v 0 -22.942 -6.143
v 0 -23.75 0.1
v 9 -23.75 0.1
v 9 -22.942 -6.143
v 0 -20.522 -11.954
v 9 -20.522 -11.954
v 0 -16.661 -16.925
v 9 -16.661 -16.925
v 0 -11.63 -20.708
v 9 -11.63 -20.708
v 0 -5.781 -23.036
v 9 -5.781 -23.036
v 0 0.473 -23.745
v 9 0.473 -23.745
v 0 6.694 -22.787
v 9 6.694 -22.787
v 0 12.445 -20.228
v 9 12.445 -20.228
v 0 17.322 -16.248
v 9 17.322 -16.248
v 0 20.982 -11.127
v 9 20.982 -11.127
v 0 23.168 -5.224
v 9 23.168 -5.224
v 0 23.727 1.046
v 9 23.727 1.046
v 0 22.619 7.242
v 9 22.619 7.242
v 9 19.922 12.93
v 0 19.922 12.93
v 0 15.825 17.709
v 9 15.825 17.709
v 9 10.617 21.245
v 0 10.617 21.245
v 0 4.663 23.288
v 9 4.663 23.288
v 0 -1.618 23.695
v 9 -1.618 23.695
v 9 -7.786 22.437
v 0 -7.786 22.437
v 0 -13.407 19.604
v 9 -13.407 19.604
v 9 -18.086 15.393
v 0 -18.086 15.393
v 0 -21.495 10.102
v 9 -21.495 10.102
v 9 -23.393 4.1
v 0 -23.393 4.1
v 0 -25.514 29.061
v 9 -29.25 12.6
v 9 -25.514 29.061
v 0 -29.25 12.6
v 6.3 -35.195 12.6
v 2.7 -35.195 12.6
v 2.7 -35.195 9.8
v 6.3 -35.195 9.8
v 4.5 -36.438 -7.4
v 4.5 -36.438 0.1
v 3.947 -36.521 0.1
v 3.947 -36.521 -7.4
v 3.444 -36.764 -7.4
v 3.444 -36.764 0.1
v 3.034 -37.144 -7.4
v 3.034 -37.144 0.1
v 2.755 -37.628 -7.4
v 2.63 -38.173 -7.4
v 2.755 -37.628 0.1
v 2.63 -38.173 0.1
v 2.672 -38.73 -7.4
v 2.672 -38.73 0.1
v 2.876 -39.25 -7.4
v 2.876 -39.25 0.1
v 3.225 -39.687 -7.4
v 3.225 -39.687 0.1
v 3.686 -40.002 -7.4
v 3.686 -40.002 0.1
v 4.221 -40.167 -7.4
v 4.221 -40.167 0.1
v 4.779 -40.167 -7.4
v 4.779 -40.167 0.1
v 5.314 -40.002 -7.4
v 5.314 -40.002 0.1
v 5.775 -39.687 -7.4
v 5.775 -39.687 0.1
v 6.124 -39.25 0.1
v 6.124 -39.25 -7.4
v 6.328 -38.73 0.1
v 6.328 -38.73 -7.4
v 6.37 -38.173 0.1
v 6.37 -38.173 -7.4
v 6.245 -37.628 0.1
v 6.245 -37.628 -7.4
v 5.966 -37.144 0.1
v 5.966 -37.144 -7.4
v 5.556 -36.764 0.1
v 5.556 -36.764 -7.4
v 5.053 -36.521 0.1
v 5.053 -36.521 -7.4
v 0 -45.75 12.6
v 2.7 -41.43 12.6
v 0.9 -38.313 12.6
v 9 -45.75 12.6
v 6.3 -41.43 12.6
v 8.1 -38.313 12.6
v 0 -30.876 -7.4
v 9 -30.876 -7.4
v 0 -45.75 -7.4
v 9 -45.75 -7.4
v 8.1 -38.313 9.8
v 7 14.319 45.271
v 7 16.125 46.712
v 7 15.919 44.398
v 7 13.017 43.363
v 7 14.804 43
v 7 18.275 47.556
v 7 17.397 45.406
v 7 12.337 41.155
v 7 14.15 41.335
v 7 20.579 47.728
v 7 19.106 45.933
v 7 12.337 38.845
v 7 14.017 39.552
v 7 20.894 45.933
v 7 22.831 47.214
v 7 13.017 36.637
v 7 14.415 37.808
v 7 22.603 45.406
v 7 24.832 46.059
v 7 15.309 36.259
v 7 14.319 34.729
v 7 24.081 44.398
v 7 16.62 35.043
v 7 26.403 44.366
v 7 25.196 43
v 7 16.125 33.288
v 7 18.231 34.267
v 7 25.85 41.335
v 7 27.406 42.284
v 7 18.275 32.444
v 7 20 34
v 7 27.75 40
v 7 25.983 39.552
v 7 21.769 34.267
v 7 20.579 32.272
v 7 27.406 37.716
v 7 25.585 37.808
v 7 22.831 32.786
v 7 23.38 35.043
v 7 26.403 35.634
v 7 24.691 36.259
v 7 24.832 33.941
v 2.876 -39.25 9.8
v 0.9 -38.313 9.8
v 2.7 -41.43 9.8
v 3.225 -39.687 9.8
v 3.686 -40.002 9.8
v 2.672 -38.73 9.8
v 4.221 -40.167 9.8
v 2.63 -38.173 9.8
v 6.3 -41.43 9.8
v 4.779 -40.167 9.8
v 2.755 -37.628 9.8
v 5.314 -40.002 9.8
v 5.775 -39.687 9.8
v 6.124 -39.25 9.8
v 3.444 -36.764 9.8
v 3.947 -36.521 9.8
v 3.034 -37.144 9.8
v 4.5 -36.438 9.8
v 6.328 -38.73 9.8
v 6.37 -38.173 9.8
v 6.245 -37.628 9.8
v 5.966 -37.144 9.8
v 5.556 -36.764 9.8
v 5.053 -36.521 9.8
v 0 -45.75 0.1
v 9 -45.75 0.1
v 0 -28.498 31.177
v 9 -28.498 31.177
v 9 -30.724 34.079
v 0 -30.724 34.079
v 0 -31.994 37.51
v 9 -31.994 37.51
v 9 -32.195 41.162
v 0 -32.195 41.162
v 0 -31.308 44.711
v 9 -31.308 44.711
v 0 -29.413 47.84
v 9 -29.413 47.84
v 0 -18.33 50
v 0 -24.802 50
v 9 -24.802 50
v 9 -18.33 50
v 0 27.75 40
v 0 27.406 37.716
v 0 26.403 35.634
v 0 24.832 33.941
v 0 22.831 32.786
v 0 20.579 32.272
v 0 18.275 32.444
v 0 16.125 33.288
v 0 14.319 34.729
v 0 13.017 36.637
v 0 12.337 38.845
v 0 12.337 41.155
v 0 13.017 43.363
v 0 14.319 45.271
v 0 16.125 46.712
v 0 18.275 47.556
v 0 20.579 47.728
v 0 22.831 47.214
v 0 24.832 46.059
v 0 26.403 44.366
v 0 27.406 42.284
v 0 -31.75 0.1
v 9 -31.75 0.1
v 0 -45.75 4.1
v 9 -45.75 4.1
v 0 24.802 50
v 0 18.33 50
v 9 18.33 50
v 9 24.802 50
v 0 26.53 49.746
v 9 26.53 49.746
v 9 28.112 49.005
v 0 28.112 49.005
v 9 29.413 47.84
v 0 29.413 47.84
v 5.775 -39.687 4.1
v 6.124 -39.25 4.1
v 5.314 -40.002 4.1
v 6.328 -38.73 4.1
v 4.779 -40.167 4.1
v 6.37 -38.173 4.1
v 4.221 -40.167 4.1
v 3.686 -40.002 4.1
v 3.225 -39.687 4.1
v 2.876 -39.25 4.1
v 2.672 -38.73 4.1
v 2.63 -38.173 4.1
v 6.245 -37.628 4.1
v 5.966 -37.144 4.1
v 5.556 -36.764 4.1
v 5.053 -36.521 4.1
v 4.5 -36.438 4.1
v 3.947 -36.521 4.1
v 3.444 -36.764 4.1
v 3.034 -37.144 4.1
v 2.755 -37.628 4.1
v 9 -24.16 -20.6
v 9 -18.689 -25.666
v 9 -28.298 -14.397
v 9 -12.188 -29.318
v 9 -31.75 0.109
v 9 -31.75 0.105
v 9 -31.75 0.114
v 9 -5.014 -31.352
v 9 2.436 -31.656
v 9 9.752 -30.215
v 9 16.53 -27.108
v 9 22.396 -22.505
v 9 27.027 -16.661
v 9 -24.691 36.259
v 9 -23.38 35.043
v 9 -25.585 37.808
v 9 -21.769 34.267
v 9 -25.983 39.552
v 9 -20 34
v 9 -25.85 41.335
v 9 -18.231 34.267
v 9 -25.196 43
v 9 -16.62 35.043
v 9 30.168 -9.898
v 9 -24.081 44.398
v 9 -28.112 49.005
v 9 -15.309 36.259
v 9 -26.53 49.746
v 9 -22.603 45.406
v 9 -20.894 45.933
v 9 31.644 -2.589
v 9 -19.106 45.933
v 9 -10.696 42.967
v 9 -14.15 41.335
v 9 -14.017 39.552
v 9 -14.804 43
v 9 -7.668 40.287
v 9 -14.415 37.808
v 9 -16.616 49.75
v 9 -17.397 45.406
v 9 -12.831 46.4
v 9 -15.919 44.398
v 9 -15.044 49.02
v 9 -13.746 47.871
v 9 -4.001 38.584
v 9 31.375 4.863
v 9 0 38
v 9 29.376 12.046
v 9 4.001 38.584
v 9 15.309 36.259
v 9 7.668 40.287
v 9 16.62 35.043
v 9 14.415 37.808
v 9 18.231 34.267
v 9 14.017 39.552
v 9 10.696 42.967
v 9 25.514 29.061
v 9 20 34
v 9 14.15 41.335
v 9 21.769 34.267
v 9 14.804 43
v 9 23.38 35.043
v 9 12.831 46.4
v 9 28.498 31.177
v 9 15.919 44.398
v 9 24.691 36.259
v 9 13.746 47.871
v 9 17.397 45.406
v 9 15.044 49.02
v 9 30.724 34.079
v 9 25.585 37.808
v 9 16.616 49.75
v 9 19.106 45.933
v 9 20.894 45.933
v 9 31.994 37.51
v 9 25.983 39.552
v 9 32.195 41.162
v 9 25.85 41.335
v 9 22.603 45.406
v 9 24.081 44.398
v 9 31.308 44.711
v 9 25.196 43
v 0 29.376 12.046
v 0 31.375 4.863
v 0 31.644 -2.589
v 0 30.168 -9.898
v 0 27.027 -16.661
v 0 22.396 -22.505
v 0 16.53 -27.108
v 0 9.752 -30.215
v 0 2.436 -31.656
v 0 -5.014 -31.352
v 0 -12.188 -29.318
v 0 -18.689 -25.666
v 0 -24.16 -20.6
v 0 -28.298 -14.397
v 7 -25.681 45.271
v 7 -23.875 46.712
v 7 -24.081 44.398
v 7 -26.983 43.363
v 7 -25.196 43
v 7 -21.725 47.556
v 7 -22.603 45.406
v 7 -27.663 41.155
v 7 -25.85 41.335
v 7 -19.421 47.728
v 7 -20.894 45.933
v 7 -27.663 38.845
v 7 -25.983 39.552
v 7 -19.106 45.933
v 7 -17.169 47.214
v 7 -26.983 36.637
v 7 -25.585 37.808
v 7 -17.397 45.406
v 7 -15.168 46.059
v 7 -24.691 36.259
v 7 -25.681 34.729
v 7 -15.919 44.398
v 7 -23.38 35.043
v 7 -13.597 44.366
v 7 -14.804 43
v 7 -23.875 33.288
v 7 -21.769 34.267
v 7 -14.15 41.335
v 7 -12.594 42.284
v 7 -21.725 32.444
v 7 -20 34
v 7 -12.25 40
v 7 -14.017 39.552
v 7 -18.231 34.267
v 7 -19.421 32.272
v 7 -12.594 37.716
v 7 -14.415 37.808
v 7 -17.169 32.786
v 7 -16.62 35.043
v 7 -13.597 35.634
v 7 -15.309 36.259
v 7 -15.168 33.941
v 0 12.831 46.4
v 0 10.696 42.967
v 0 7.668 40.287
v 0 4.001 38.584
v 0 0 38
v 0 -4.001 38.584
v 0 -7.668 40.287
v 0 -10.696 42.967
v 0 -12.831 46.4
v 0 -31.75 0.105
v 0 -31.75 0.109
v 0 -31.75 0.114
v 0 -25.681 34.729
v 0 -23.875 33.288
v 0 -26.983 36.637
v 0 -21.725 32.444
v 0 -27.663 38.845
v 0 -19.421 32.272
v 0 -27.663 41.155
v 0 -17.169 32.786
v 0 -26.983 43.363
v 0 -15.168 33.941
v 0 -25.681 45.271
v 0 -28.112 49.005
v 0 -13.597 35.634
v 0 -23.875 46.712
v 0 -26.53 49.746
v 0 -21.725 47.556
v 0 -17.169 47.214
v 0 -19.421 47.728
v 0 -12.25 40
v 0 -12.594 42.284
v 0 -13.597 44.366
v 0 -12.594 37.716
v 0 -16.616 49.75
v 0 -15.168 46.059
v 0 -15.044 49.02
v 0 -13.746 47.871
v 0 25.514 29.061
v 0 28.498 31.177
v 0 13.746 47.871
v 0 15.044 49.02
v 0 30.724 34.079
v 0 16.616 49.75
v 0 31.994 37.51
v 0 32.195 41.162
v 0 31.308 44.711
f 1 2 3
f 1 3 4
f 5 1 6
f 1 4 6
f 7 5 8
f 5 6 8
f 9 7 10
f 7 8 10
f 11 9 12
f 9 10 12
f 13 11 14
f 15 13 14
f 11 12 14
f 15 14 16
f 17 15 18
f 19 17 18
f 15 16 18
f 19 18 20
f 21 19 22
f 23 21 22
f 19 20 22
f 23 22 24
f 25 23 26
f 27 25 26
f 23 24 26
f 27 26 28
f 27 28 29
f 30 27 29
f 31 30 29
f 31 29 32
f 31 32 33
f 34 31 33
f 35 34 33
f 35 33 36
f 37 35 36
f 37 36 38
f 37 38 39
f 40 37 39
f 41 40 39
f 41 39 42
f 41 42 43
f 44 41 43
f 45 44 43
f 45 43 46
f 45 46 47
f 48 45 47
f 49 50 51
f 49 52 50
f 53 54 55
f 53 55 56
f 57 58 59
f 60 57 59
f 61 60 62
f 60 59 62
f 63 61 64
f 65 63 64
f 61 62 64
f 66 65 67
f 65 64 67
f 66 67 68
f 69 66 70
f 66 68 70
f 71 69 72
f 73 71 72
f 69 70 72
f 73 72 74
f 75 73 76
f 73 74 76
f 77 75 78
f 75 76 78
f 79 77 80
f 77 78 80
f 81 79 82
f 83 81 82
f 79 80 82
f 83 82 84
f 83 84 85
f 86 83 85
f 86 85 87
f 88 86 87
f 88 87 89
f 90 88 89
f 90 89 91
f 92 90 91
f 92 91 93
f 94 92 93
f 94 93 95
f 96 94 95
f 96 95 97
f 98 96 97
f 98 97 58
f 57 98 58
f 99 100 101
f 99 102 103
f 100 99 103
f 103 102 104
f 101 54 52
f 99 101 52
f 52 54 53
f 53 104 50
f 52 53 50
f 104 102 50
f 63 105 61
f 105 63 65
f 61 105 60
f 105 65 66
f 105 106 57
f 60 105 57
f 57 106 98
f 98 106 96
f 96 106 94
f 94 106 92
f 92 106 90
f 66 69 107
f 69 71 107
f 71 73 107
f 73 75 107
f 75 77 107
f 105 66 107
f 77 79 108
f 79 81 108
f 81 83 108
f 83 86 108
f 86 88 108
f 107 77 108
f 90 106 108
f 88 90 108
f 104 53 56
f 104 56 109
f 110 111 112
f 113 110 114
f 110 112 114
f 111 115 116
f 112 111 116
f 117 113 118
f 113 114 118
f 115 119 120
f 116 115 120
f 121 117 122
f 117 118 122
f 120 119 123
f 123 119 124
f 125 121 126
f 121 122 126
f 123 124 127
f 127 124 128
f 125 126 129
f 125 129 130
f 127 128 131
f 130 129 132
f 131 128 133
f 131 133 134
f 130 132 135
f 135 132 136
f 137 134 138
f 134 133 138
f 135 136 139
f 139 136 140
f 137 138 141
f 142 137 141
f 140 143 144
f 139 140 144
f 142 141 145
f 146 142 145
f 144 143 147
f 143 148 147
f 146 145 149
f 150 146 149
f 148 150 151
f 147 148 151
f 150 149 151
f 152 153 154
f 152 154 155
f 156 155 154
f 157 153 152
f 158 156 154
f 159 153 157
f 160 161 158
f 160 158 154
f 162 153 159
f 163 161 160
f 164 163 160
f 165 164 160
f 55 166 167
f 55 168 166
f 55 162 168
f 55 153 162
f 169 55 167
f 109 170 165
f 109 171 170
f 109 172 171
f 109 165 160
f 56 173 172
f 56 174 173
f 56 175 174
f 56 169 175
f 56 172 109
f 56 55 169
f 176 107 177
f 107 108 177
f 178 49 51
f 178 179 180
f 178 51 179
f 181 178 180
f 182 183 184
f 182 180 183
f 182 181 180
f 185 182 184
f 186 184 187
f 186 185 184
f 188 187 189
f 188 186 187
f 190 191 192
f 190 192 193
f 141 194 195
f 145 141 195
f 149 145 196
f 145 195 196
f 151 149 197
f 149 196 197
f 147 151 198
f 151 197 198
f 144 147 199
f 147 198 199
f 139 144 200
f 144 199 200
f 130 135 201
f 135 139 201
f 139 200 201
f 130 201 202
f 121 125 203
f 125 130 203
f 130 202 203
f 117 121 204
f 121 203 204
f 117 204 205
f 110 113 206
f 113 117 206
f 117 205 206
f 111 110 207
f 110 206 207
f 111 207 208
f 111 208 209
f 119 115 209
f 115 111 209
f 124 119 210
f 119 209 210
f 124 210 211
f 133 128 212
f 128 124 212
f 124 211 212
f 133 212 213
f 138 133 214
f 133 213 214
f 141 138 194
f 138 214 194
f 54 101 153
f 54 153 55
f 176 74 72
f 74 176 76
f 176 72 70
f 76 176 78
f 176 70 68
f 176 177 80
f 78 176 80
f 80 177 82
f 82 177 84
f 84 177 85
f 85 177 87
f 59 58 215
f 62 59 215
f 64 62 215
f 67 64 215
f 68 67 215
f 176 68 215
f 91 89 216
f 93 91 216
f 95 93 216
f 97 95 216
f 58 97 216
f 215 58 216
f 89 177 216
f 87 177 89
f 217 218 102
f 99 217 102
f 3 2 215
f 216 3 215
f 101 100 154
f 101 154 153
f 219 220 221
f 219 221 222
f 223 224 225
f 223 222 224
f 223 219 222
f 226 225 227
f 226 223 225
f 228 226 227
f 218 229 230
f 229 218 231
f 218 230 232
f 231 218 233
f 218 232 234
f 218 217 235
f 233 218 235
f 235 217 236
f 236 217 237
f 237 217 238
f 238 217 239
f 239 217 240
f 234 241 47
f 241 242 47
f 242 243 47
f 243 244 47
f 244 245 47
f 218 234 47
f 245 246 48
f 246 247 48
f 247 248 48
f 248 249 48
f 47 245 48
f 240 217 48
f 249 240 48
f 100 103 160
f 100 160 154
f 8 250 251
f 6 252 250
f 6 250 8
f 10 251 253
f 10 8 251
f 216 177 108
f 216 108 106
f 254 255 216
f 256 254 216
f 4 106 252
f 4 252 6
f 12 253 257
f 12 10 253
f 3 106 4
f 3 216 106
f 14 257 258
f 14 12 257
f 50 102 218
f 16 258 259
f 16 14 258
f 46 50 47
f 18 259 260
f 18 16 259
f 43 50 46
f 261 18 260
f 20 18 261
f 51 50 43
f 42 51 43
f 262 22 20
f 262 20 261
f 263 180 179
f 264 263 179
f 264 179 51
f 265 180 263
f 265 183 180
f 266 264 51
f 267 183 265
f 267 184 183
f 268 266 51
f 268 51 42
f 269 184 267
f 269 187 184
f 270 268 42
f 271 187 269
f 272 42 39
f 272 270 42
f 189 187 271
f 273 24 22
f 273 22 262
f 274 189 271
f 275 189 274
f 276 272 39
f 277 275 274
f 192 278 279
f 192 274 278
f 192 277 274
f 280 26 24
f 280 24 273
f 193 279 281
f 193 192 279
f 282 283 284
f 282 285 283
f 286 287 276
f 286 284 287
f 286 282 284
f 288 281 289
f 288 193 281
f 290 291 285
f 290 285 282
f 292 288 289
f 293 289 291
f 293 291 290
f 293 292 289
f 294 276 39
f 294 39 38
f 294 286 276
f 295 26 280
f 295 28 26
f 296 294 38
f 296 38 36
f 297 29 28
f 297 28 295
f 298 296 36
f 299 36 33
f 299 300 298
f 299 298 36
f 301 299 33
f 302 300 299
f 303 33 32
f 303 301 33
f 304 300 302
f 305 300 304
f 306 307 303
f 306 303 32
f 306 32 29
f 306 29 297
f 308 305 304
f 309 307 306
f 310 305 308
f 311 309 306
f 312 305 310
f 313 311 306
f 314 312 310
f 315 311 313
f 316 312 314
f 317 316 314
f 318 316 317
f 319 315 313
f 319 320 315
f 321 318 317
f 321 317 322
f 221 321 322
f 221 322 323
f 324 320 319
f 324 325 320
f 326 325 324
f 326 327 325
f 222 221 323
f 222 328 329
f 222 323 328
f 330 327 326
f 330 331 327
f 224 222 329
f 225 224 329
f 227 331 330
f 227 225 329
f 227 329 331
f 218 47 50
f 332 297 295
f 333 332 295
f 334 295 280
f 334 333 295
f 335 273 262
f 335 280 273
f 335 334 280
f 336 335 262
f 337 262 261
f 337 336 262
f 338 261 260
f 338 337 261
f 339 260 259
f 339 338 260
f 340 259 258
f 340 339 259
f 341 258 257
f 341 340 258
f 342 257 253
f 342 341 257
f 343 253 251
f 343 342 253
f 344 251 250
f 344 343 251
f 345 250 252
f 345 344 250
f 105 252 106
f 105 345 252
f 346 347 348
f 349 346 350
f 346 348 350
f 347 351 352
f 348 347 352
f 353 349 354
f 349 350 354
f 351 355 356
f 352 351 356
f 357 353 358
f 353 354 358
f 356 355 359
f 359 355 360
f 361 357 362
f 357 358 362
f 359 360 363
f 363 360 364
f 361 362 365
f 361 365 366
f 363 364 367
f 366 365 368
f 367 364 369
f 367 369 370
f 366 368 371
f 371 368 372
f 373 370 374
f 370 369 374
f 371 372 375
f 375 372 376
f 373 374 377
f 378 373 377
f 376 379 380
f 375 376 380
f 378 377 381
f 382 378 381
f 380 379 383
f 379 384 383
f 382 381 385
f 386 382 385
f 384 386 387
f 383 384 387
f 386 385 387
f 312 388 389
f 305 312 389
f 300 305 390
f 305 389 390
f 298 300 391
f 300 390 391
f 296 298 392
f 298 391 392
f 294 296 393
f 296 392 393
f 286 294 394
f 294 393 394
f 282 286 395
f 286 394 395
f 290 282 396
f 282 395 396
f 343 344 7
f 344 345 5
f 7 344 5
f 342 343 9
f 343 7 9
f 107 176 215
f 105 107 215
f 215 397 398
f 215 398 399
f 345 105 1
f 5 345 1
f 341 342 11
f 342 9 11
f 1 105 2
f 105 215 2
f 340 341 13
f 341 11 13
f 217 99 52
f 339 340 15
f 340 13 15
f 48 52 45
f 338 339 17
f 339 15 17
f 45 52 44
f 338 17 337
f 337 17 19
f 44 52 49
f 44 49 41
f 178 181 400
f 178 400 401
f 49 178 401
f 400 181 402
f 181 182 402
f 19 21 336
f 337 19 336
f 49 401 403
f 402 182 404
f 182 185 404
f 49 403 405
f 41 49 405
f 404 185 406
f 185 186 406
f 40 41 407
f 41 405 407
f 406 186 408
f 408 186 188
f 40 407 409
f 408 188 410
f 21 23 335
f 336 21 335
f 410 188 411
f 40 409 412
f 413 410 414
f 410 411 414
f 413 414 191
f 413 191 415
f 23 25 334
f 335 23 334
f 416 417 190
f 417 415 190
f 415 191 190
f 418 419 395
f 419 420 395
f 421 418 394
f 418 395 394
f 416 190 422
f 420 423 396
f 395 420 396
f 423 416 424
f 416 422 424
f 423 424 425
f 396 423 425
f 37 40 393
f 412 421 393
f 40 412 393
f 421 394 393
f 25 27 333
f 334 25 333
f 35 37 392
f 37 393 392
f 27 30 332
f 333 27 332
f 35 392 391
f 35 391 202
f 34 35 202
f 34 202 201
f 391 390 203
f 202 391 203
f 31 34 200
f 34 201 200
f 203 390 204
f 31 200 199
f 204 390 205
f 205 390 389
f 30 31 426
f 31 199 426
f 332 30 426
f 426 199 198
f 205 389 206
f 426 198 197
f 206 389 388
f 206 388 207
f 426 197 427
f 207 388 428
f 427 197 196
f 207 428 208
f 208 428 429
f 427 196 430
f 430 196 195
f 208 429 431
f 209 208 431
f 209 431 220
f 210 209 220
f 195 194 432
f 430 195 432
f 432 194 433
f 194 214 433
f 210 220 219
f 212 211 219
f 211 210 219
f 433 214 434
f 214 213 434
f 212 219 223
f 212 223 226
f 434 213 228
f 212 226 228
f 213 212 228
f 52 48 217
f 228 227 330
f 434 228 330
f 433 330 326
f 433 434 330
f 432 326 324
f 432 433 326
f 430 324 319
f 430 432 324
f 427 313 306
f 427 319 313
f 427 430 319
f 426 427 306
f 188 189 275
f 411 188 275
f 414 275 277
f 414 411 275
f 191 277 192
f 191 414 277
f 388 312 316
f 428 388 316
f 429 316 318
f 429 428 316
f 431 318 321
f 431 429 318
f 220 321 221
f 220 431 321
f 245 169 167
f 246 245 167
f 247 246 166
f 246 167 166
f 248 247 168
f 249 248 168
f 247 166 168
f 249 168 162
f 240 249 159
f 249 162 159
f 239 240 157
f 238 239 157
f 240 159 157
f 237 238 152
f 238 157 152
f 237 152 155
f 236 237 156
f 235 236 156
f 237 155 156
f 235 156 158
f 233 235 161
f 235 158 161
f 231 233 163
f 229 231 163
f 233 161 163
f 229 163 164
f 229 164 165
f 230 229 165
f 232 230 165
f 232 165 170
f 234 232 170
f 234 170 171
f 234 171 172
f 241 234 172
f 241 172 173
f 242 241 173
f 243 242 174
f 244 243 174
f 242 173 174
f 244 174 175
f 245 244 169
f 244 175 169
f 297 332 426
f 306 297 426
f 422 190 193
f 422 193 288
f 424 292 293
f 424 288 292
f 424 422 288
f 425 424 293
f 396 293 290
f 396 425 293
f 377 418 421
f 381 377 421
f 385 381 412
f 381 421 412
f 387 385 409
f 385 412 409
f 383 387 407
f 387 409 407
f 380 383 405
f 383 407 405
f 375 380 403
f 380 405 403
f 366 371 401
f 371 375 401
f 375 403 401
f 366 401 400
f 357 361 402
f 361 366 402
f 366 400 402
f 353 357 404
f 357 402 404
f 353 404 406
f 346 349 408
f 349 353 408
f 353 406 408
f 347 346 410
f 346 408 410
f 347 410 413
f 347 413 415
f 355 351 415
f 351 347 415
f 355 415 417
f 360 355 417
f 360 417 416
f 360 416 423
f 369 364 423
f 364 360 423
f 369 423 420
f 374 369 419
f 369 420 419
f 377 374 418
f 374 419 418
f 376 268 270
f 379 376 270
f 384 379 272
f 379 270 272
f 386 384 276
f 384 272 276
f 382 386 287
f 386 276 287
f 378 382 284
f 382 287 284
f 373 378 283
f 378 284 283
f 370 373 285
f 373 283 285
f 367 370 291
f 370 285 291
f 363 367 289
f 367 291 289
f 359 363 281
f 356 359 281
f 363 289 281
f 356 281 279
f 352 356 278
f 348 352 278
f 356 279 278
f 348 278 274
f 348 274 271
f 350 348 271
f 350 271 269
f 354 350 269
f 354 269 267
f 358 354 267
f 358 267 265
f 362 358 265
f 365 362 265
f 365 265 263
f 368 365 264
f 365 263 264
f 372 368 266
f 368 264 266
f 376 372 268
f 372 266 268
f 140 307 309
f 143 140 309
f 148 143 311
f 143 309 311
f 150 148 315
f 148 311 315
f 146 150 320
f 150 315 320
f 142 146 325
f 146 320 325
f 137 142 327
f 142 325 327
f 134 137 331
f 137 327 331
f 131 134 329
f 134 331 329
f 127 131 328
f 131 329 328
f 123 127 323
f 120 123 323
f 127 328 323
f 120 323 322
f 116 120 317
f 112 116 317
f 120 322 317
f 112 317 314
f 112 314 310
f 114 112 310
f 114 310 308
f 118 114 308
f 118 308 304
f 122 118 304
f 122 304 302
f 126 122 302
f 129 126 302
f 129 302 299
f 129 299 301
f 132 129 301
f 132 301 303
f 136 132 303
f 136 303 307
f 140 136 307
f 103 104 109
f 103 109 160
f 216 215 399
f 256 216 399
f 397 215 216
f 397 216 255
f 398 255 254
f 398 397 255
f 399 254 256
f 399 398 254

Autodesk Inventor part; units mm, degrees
sketch "Boceto1" plane through (0, 0, 0) normal (1, 0, 0) x (0, 1, 0)
  circle A0 centre (0, 0) radius 23.75
  arc A1 (-29.376, 12.0463) -> (29.376, 12.0463) centre (0, 0) ccw
  line L0 (-29.376, 12.0463) -> (-25.5135, 29.0609)
  line L1 (29.376, 12.0463) -> (25.5135, 29.0609)
  circle A2 centre (-20, 40) radius 7.75
  circle A3 centre (20, 40) radius 7.75
  arc A4 (-12.8312, 46.4) -> (12.8312, 46.4) centre (0, 52) ccw
  line L2 (-24.8023, 50) -> (-18.3303, 50)
  arc A5 (-29.4126, 47.84) -> (-25.5135, 29.0609) centre (-20, 40) ccw
  arc A6 (25.5135, 29.0609) -> (29.4126, 47.84) centre (20, 40) ccw
  line L3 (18.3303, 50) -> (24.8023, 50)
  arc A7 (18.3303, 50) -> (12.8312, 46.4) centre (18.3303, 44) ccw
  arc A8 (-12.8312, 46.4) -> (-18.3303, 50) centre (-18.3303, 44) ccw
  arc A9 (-24.8023, 50) -> (-29.4126, 47.84) centre (-24.8023, 44) ccw
  arc A10 (29.4126, 47.84) -> (24.8023, 50) centre (24.8023, 44) ccw
  point P0 (-27.0755, 50)
  point P1 (-32.25, 40)
  point P2 (32.25, 40)
  point P3 (-27.75, 40)
  point P4 (27.75, 40)
  point P5 (-13.8564, 50)
  point P6 (13.8564, 50)
  point P7 (0, 38)
  point P8 (27.0755, 50)
  dimension "d4" = 15.5
  dimension "d5" = 15.5
  dimension "d0" = 47.5
  dimension "d1" = 63.5
  dimension "d2" = 25.58
  dimension "d7" = 4.5
  dimension "d8" = 4.5
  dimension "d25" = 51.027
  dimension "d55" = 10
  dimension "d58" = 40
  dimension "d59" = 20
  dimension "d60" = 40
  dimension "d61" = 52
  dimension "d62" = 14
  dimension "d63" = 6
  dimension "d64" = 6
extrude "Extrusión1" add sketch "Boceto1" along normal blind 9
sketch "Boceto2" plane through (9, 0, 0) normal (1, 0, 0) x (0, 0, -1)
  arc A0 (-12.0463, -29.376) -> (-12.0463, 29.376) centre (0, 0) ccw projected
  circle A1 centre (0, 0) radius 23.75 projected
  line L0 (7.4, -22.5677) -> (7.4, -45.7498)
  line L1 (7.4, -45.7498) -> (-0.1, -45.7498)
  line L2 (-0.1, -45.7498) -> (-0.1, -23.7498)
  circle A2 centre (0, 0) radius 23.75 projected
  line L3 (-4.1, -23.3934) -> (-4.1, -45.7498)
  line L4 (-4.1, -45.7498) -> (-12.6, -45.7498)
  line L5 (-12.6, -45.7498) -> (-12.6, -20.1321)
  line L6 (-50, -18.3303) -> (-50, -24.8023) projected
  point P0 (-50, -15.6404)
  point P1 (-50, -27.0755)
  point P2 (-29.0609, -25.5135)
  dimension "d17" = 8.5
  dimension "d18" = 7.5
  dimension "d19" = 4
  dimension "d26" = 22
  dimension "d27" = 37.4
extrude "Extrusión2" add sketch "Boceto2" against normal blind 9 contours L3 L4 L5 A1 | L2 A1 L0 A0 | A0 L0 L1 L2
sketch "Boceto3" plane through (9, 0, 0) normal (1, 0, 0) x (0, 0, -1)
  circle A0 centre (-40, -20) radius 7.75 projected
  circle A1 centre (-40, 20) radius 7.75 projected
  circle A2 centre (-40, -20) radius 6
  circle A3 centre (-40, 20) radius 6
  point P0 (0, 0)
  dimension "d31" = 12
  dimension "d32" = 12
extrude "Extrusión3" add sketch "Boceto3" against normal blind 2
sketch "Boceto4" plane through (9, -45.7498, -7.4) normal (0, 0, -1) x (-1, 0, 0)
  line L0 (0, 0) -> (9, 0) projected
  line L1 (9, 14.8742) -> (9, 0) projected
  point P0 (9, 45.7498)
  point P1 (4.5, 7.4371)
  point P2 (4.5, 0)
  point P3 (9, 7.4371)
hole "Agujero1" at (4.5, -38.3127, -7.4) direction (0, 0, 1) diameter 3.75 end through all
sketch "Boceto5" plane through (9, -45.7498, 12.6) normal (0, 0, 1) x (1, 0, 0)
  circle A0 centre (-4.5, 7.4371) radius 1.875 projected
  line L0 (-6.2999, 10.5546) -> (-2.7001, 10.5546)
  line L1 (-2.7001, 10.5546) -> (-0.9002, 7.4371)
  line L2 (-0.9002, 7.4371) -> (-2.7001, 4.3196)
  line L3 (-2.7001, 4.3196) -> (-6.2999, 4.3196)
  line L4 (-6.2999, 4.3196) -> (-8.0998, 7.4371)
  line L5 (-8.0998, 7.4371) -> (-6.2999, 10.5546)
  point P0 (-9, 45.7498)
  dimension "d44" = 6.235
extrude "Extrusión4" cut sketch "Boceto5" against normal blind 2.8
sketch "Boceto6" plane through (0, 0, 0) normal (-1, 0, 0) x (0, 0, 1)
  line L0 (0.1, -45.7498) -> (0.1, -31.7498) projected
  line L1 (4.1, -31.4842) -> (4.1, -45.7498) projected
  line L2 (0.1, -31.7498) -> (4.1, -31.7498)
  line L3 (4.1, -31.7498) -> (4.1, -21.7498)
  line L4 (4.1, -21.7498) -> (0.1, -21.7498)
  line L5 (0.1, -21.7498) -> (0.1, -31.7498)
  point P0 (0, 0)
  dimension "d50" = 10
extrude "Extrusión5" cut sketch "Boceto6" against normal through all
equation "\"d5\" = d4"
properties part number "G004164_Cycl_carroZ_inferior"
